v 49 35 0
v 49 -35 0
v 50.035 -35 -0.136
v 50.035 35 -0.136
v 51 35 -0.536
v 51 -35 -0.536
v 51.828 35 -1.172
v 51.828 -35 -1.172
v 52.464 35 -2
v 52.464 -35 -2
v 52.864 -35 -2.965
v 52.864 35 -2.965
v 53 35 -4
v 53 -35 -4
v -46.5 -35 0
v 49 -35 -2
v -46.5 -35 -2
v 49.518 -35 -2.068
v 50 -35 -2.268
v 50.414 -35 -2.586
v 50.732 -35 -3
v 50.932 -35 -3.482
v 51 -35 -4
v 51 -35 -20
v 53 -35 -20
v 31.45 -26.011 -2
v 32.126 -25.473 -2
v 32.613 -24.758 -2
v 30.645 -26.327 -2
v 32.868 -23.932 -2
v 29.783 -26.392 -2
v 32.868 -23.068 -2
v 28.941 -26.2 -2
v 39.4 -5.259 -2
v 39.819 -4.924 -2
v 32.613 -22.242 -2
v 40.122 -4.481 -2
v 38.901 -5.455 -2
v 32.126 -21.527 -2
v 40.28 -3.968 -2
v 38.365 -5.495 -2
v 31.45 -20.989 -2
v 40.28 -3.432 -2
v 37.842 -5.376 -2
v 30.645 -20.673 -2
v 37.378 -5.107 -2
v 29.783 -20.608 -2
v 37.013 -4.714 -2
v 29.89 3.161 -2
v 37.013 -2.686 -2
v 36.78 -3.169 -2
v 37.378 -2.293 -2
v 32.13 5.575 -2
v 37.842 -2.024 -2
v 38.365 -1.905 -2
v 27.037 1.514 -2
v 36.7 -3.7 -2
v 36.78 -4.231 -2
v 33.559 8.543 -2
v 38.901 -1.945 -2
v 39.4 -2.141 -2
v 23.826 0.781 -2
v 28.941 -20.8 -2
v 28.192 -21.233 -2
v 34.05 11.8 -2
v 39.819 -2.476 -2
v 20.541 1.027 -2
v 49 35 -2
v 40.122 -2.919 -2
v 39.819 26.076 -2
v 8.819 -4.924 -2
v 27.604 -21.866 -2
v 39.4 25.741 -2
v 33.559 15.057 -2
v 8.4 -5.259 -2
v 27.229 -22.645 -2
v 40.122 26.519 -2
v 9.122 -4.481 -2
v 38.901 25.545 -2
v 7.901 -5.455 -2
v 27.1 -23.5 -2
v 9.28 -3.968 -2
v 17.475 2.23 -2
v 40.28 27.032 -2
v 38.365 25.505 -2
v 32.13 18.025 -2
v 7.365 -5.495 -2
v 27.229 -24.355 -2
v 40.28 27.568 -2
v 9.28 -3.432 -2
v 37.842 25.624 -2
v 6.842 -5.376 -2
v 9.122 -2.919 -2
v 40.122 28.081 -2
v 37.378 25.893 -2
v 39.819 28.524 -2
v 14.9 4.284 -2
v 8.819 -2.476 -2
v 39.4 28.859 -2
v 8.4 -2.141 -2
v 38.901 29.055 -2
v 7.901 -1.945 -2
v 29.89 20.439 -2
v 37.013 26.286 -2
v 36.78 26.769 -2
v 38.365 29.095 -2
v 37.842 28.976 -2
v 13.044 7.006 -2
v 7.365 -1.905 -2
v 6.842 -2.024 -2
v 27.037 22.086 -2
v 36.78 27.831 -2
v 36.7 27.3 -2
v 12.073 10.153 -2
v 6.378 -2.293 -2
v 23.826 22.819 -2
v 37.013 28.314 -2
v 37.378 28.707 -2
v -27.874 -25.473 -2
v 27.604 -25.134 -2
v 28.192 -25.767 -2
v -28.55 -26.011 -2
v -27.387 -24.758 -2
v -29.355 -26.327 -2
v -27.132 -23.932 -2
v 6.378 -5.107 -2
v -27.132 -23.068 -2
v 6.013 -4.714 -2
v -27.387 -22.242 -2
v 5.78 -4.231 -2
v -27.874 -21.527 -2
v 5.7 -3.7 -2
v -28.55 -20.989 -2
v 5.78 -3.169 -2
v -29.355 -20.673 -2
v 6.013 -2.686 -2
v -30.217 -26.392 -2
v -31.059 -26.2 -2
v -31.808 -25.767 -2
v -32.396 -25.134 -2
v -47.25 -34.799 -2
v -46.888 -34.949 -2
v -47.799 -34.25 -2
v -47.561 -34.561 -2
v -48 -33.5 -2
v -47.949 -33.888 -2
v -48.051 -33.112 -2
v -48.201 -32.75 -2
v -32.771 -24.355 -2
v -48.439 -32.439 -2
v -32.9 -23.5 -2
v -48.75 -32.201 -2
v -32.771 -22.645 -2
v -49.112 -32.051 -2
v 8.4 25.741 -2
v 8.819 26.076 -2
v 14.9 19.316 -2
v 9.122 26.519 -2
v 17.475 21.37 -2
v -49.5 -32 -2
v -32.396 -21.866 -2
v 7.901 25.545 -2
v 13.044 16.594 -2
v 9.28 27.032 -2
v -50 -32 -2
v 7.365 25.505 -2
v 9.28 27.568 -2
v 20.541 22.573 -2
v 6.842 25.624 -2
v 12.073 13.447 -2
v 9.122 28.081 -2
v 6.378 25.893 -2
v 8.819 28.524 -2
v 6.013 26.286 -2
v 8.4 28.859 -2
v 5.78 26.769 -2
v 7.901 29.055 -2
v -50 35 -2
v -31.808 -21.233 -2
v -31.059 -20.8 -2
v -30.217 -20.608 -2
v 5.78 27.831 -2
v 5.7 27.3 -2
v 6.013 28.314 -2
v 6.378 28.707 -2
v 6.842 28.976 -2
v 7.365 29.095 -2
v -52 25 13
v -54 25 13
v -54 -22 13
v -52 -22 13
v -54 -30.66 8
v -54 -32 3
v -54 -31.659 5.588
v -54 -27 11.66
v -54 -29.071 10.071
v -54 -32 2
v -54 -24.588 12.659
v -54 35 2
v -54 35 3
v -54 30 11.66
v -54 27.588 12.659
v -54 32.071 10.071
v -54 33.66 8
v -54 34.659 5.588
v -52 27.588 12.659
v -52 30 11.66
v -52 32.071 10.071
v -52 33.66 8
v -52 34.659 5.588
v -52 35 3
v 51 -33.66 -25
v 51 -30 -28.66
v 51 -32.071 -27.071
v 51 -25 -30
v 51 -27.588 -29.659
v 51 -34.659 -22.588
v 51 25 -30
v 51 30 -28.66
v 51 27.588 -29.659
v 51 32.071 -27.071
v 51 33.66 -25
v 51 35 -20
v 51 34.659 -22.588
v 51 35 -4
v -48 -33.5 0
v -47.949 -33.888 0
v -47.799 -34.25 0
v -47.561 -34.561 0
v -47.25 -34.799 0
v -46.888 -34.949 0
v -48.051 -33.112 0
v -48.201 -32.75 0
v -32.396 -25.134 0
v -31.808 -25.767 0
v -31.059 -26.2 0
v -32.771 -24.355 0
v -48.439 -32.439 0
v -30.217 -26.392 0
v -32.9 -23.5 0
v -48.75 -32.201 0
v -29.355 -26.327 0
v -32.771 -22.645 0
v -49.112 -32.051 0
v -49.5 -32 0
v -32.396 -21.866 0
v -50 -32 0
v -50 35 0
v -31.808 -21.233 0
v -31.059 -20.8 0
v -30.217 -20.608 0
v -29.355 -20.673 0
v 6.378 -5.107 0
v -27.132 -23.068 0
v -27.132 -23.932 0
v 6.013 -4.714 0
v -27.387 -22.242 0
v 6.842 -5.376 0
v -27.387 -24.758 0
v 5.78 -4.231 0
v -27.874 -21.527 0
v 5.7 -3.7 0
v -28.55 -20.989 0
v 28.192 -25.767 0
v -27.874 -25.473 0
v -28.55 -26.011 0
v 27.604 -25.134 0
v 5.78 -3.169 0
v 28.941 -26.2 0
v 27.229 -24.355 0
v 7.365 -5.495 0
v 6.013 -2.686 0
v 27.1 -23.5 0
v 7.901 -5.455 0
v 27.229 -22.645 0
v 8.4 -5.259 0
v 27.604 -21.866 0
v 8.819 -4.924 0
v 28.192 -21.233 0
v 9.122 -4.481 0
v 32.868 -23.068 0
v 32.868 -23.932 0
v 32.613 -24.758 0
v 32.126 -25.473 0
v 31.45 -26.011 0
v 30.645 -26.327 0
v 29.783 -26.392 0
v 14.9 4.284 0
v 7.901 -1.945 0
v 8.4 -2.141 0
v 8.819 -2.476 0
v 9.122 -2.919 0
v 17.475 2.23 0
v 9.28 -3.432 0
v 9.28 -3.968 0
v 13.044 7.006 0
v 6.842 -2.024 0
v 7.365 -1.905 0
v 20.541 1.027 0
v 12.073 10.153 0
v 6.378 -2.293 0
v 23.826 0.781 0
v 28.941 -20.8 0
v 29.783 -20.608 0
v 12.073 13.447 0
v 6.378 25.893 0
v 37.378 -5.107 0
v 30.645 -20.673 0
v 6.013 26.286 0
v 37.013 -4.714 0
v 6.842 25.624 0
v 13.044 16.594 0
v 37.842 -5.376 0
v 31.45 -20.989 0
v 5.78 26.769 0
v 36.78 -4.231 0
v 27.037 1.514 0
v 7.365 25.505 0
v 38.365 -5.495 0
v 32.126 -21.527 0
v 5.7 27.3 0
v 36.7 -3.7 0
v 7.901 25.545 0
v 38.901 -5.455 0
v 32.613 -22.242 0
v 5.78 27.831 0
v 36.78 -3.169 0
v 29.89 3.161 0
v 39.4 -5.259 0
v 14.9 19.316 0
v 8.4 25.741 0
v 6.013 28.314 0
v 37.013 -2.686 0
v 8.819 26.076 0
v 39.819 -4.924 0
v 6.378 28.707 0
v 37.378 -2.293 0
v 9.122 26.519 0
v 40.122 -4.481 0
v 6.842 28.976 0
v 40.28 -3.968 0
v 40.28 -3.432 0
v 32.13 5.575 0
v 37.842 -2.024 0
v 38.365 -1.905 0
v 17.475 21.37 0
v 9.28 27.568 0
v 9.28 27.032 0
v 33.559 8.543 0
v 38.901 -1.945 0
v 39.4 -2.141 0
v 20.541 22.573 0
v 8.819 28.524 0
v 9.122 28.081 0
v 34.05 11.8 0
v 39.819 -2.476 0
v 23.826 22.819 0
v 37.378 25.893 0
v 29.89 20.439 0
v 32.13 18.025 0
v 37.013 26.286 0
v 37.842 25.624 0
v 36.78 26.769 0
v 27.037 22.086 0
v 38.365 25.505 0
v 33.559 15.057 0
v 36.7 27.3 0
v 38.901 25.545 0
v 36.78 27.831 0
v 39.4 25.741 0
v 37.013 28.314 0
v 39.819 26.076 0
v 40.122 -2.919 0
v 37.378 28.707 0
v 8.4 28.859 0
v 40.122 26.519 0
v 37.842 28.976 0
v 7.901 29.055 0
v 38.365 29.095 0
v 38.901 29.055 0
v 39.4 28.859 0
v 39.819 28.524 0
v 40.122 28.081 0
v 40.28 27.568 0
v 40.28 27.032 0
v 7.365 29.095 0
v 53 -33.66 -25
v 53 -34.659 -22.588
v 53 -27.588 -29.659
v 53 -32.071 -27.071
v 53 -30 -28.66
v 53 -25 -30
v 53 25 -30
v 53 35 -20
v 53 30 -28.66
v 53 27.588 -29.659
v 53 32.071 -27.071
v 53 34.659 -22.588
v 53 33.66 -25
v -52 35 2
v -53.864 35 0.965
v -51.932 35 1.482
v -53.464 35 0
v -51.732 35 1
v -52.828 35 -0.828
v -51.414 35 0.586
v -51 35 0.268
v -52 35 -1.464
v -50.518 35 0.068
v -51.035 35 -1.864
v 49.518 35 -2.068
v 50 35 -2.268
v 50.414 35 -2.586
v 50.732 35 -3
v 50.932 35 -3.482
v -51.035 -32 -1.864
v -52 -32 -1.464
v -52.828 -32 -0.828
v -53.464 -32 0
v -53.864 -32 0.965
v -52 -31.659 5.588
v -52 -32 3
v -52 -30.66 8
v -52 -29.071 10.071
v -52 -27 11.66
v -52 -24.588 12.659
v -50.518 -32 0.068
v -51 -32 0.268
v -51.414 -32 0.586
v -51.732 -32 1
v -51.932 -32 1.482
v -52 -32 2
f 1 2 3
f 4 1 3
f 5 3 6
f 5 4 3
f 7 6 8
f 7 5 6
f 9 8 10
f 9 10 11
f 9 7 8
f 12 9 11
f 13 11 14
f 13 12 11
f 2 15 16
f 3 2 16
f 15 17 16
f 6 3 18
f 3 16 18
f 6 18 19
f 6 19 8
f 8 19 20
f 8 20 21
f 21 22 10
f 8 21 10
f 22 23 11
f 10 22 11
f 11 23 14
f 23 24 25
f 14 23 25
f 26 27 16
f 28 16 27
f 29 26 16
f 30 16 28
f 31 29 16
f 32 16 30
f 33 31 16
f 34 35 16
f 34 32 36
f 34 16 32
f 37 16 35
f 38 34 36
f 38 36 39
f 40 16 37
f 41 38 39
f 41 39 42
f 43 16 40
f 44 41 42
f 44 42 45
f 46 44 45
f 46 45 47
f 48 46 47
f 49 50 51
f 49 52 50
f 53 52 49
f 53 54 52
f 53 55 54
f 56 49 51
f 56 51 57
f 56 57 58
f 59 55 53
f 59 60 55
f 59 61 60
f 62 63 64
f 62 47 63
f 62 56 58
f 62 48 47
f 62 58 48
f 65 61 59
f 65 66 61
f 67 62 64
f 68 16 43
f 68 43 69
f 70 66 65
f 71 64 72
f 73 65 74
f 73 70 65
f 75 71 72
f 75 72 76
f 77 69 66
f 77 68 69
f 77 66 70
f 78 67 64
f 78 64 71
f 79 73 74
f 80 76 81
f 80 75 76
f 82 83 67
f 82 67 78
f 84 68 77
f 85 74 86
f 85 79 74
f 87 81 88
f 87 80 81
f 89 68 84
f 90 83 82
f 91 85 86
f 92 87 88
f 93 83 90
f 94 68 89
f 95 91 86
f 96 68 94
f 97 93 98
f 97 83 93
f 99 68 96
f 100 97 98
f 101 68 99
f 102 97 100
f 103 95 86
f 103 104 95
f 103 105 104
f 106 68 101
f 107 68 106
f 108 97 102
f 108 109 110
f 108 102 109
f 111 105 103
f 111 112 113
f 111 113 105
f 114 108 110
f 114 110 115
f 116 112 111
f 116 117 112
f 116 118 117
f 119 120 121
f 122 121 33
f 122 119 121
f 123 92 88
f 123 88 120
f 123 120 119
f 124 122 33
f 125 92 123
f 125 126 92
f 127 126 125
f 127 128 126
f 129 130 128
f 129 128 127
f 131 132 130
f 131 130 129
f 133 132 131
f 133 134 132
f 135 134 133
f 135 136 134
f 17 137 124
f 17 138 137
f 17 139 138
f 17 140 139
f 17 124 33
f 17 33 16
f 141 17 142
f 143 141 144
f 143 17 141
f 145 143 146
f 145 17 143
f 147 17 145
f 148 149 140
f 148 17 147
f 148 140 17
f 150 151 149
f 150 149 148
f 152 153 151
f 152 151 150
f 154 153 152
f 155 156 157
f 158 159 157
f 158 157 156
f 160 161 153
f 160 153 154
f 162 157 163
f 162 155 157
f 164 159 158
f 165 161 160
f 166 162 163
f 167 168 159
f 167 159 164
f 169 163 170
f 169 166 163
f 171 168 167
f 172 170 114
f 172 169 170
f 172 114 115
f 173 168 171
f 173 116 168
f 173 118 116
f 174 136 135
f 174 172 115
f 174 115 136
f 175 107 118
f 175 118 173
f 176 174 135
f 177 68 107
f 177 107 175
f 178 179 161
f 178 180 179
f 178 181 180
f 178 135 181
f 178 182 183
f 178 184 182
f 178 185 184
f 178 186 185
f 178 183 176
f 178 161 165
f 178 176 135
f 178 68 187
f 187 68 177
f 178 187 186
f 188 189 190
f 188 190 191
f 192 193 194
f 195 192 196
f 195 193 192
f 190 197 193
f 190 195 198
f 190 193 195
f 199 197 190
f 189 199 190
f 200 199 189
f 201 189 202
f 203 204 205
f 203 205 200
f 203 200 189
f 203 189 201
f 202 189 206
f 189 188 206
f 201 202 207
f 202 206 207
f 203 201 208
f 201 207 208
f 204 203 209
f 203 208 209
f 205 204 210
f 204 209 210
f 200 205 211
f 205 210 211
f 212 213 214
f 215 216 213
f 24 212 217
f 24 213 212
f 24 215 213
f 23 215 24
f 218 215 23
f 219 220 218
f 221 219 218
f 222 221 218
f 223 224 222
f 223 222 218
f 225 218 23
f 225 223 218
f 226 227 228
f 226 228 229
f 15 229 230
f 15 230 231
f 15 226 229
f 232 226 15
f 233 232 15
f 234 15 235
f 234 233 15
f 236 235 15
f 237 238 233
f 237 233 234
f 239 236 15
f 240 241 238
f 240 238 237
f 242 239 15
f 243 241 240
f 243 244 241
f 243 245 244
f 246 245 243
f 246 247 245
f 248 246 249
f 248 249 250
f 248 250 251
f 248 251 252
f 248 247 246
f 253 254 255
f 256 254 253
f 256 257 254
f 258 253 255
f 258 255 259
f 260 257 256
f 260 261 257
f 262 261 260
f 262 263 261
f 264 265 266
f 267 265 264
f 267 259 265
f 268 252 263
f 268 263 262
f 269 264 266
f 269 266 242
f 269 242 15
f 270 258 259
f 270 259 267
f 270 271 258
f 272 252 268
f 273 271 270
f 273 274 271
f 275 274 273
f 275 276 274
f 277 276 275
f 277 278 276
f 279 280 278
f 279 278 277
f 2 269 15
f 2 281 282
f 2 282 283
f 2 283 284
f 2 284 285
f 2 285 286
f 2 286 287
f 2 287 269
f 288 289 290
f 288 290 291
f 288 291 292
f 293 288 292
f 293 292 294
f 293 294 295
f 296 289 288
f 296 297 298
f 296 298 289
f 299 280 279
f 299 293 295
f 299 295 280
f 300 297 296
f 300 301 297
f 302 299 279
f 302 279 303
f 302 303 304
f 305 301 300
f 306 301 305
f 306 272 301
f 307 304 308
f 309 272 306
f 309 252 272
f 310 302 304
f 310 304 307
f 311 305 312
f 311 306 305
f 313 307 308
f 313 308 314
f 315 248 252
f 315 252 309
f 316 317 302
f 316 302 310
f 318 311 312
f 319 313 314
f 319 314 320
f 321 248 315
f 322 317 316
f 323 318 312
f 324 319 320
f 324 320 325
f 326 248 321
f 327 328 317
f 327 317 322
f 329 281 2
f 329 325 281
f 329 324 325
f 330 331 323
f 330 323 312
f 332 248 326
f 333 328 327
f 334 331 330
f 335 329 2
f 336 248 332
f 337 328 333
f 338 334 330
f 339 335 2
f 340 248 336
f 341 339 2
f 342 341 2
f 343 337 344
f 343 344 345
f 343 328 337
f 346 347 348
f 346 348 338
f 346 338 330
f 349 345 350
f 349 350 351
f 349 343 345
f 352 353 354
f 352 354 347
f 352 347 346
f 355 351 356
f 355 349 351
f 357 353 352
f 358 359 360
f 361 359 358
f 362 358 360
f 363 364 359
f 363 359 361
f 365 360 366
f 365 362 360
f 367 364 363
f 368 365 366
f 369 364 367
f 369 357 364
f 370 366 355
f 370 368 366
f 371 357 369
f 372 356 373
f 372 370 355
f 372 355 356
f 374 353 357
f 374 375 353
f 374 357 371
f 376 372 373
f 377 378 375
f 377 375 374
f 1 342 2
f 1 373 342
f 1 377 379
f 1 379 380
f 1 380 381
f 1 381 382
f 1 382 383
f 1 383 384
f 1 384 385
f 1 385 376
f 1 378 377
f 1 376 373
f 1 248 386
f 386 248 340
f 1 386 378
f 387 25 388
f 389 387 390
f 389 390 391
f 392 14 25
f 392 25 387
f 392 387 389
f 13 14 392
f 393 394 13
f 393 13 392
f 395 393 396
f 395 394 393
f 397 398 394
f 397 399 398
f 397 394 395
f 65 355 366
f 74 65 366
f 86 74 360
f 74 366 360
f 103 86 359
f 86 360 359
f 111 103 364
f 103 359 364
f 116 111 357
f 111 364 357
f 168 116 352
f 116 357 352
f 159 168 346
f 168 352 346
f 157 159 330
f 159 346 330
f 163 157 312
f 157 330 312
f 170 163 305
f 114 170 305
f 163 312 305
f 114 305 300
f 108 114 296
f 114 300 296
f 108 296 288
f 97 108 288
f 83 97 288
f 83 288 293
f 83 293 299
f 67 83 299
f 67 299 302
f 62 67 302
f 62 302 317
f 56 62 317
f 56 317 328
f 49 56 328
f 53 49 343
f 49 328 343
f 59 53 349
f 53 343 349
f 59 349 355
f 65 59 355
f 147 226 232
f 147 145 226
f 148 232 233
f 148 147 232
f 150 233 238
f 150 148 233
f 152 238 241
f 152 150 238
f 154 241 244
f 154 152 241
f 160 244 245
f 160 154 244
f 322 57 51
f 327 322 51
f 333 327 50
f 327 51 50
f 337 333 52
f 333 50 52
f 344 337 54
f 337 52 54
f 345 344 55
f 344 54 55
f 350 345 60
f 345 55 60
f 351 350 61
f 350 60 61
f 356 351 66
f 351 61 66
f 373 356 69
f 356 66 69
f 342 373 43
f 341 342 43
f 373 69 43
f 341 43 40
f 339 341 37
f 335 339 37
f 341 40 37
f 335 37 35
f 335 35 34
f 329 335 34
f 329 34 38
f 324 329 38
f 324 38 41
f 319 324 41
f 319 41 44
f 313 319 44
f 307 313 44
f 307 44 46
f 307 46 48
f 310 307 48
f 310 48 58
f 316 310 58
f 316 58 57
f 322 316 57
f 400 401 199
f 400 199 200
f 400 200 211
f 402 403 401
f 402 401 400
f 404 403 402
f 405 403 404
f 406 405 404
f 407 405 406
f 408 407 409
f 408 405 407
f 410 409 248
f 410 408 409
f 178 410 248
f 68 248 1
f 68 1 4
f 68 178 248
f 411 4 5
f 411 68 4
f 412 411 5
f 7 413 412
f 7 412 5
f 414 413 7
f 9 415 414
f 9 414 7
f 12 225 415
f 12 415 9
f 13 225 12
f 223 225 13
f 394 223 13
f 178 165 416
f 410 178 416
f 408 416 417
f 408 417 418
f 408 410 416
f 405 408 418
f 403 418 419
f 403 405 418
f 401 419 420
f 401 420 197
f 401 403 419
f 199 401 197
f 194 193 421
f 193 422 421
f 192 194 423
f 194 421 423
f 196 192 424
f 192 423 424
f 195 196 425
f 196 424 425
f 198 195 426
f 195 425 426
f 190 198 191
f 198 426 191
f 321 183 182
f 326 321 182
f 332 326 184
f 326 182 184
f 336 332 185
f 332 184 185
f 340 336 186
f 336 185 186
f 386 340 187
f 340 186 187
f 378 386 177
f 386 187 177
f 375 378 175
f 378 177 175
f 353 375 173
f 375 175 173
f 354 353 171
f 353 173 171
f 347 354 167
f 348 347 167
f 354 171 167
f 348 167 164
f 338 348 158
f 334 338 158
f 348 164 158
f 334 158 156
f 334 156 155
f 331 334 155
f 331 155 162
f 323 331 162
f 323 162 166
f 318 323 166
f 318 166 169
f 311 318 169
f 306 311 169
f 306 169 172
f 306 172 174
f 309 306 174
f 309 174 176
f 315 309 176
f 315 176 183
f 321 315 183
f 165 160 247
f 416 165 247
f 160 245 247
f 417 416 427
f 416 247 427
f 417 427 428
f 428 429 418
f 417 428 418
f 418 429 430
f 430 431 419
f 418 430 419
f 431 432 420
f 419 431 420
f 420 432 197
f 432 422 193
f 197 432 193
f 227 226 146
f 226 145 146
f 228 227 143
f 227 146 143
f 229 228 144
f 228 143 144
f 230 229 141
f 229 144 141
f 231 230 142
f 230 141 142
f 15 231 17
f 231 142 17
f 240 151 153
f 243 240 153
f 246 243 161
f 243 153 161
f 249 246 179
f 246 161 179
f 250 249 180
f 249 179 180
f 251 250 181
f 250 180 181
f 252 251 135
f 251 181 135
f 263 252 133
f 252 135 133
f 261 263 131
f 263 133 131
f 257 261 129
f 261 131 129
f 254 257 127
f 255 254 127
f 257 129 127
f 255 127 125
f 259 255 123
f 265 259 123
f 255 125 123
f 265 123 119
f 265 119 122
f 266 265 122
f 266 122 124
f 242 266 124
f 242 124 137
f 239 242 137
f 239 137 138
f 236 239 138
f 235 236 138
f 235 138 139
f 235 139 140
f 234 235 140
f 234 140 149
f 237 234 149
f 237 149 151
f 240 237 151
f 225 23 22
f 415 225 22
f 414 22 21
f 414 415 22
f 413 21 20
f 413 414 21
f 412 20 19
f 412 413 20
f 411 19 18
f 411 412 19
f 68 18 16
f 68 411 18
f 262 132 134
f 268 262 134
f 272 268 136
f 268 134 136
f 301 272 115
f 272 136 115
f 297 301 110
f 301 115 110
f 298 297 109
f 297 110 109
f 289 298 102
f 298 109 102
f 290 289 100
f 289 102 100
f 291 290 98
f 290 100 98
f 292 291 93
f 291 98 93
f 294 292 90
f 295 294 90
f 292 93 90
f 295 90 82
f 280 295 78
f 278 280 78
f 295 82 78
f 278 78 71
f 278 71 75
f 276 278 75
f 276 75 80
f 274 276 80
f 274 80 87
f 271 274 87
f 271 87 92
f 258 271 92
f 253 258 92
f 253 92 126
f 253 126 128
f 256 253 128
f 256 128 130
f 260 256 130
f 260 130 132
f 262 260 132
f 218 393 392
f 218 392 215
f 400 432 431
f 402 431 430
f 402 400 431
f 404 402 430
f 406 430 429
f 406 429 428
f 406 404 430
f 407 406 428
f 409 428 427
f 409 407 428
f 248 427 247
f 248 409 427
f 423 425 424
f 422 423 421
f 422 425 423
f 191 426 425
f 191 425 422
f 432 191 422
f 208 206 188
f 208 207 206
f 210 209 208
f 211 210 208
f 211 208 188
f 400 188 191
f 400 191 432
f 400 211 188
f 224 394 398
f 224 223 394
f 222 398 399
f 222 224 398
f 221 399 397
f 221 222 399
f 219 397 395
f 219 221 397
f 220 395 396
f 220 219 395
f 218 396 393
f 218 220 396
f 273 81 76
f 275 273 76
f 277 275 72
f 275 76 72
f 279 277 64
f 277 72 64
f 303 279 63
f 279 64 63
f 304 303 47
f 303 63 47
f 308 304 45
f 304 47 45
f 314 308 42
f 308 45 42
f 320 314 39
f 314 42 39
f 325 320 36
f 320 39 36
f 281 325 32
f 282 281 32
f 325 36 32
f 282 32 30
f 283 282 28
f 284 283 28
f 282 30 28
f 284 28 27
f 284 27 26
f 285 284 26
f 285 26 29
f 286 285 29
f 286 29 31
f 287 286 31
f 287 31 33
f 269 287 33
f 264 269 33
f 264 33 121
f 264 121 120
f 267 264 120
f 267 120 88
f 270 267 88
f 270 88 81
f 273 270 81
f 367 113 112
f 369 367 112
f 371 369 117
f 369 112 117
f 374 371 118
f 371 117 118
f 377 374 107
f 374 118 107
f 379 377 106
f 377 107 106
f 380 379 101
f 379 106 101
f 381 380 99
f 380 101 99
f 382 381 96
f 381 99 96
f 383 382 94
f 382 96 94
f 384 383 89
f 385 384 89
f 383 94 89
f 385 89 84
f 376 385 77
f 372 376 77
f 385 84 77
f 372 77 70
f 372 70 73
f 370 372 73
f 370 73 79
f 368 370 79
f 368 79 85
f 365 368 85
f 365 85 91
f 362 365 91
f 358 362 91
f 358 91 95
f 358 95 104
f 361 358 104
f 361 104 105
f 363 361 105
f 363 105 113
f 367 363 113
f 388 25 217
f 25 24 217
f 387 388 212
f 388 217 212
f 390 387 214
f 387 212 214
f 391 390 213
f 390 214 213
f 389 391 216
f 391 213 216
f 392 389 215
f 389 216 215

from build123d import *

# Parameters (mm, degrees)
SKETCH1_W            = 96
SKETCH1_H            = 70
BASE_FLANGE1_DEPTH   = 2
SKETCH6_R            = 11.05
CUT_EXTRUDE1_DEPTH   = 2
M3_CLEARANCE_HOLE1_D = 3.6
EDGE_FLANGE1_DEPTH   = 67
M5_CLEARANCE_HOLE1_D = 5.8
EDGE_FLANGE2_DEPTH   = 70
FILLET1_R            = 10
FILLET2_R            = 1.5


# Sheet-metal steps are written as plain solids
with BuildPart() as part:
    # Sketch1 → Base-Flange1 (new body)
    with BuildSketch(Plane.XY):
        Rectangle(SKETCH1_W, SKETCH1_H)
    extrude(amount=-BASE_FLANGE1_DEPTH)

    # Sketch6 → Cut-Extrude1 (cut)
    with BuildSketch(Plane.XY):
        with Locations((23, 11.8)):
            Circle(SKETCH6_R)
    extrude(amount=-CUT_EXTRUDE1_DEPTH, mode=Mode.SUBTRACT)

    # M3 Clearance Hole1 (through all)
    with Locations(Plane.XY):
        with Locations((38.5, 27.3), (38.5, -3.7), (7.5, 27.3), (7.5, -3.7)):
            Hole(M3_CLEARANCE_HOLE1_D / 2)

    # Edge-Flange1 section (across the edge) → Edge-Flange1 (add)
    with BuildSketch(Plane(origin=(-52, 35, 0), x_dir=(1, 0, 0), z_dir=(0, -1, 0))):
        with BuildLine():
            Line((-2, 2), (-2, 13))
            Line((-2, 13), (0, 13))
            Line((0, 13), (0, 2))
            ThreePointArc((0, 2), (0.585786438, 0.585786438), (2, 0))
            Line((2, 0), (4, 0))
            Line((4, 0), (4, -2))
            Line((4, -2), (2, -2))
            ThreePointArc((2, -2), (-0.828427125, -0.828427125), (-2, 2))
        make_face()
    extrude(amount=EDGE_FLANGE1_DEPTH)

    # M5 Clearance Hole1 (through all)
    with Locations(Plane.XY):
        with Locations((30, -23.5), (-30, -23.5)):
            Hole(M5_CLEARANCE_HOLE1_D / 2)

    # Edge-Flange2 section (across the edge) → Edge-Flange2 (add)
    with BuildSketch(Plane(origin=(51, 35, -2), x_dir=(-1, 0, 0), z_dir=(0, -1, 0))):
        with BuildLine():
            Line((-2, 2), (-2, 28))
            Line((-2, 28), (0, 28))
            Line((0, 28), (0, 2))
            ThreePointArc((0, 2), (0.585786438, 0.585786438), (2, 0))
            Line((2, 0), (3, 0))
            Line((3, 0), (3, -2))
            Line((3, -2), (2, -2))
            ThreePointArc((2, -2), (-0.828427125, -0.828427125), (-2, 2))
        make_face()
    extrude(amount=EDGE_FLANGE2_DEPTH)

    # Fillet1
    fillet1_edges = [part.edges().sort_by_distance(p)[0] for p in [
        (52, 35, -30),
        (52, -35, -30),
        (-53, 35, 13),
        (-53, -32, 13),
    ]]
    fillet(fillet1_edges, radius=FILLET1_R)

    # Fillet2
    fillet2_edges = [part.edges().sort_by_distance(p)[0] for p in [
        (-48, -32, -1),
    ]]
    fillet(fillet2_edges, radius=FILLET2_R)
    fillet2_2_edges = [part.edges().sort_by_distance(p)[0] for p in [
        (-48, -35, -1),
    ]]
    fillet(fillet2_2_edges, radius=FILLET2_R - 0.0001)  # a hair under: the kernel refuses the full size


solid = part.part
